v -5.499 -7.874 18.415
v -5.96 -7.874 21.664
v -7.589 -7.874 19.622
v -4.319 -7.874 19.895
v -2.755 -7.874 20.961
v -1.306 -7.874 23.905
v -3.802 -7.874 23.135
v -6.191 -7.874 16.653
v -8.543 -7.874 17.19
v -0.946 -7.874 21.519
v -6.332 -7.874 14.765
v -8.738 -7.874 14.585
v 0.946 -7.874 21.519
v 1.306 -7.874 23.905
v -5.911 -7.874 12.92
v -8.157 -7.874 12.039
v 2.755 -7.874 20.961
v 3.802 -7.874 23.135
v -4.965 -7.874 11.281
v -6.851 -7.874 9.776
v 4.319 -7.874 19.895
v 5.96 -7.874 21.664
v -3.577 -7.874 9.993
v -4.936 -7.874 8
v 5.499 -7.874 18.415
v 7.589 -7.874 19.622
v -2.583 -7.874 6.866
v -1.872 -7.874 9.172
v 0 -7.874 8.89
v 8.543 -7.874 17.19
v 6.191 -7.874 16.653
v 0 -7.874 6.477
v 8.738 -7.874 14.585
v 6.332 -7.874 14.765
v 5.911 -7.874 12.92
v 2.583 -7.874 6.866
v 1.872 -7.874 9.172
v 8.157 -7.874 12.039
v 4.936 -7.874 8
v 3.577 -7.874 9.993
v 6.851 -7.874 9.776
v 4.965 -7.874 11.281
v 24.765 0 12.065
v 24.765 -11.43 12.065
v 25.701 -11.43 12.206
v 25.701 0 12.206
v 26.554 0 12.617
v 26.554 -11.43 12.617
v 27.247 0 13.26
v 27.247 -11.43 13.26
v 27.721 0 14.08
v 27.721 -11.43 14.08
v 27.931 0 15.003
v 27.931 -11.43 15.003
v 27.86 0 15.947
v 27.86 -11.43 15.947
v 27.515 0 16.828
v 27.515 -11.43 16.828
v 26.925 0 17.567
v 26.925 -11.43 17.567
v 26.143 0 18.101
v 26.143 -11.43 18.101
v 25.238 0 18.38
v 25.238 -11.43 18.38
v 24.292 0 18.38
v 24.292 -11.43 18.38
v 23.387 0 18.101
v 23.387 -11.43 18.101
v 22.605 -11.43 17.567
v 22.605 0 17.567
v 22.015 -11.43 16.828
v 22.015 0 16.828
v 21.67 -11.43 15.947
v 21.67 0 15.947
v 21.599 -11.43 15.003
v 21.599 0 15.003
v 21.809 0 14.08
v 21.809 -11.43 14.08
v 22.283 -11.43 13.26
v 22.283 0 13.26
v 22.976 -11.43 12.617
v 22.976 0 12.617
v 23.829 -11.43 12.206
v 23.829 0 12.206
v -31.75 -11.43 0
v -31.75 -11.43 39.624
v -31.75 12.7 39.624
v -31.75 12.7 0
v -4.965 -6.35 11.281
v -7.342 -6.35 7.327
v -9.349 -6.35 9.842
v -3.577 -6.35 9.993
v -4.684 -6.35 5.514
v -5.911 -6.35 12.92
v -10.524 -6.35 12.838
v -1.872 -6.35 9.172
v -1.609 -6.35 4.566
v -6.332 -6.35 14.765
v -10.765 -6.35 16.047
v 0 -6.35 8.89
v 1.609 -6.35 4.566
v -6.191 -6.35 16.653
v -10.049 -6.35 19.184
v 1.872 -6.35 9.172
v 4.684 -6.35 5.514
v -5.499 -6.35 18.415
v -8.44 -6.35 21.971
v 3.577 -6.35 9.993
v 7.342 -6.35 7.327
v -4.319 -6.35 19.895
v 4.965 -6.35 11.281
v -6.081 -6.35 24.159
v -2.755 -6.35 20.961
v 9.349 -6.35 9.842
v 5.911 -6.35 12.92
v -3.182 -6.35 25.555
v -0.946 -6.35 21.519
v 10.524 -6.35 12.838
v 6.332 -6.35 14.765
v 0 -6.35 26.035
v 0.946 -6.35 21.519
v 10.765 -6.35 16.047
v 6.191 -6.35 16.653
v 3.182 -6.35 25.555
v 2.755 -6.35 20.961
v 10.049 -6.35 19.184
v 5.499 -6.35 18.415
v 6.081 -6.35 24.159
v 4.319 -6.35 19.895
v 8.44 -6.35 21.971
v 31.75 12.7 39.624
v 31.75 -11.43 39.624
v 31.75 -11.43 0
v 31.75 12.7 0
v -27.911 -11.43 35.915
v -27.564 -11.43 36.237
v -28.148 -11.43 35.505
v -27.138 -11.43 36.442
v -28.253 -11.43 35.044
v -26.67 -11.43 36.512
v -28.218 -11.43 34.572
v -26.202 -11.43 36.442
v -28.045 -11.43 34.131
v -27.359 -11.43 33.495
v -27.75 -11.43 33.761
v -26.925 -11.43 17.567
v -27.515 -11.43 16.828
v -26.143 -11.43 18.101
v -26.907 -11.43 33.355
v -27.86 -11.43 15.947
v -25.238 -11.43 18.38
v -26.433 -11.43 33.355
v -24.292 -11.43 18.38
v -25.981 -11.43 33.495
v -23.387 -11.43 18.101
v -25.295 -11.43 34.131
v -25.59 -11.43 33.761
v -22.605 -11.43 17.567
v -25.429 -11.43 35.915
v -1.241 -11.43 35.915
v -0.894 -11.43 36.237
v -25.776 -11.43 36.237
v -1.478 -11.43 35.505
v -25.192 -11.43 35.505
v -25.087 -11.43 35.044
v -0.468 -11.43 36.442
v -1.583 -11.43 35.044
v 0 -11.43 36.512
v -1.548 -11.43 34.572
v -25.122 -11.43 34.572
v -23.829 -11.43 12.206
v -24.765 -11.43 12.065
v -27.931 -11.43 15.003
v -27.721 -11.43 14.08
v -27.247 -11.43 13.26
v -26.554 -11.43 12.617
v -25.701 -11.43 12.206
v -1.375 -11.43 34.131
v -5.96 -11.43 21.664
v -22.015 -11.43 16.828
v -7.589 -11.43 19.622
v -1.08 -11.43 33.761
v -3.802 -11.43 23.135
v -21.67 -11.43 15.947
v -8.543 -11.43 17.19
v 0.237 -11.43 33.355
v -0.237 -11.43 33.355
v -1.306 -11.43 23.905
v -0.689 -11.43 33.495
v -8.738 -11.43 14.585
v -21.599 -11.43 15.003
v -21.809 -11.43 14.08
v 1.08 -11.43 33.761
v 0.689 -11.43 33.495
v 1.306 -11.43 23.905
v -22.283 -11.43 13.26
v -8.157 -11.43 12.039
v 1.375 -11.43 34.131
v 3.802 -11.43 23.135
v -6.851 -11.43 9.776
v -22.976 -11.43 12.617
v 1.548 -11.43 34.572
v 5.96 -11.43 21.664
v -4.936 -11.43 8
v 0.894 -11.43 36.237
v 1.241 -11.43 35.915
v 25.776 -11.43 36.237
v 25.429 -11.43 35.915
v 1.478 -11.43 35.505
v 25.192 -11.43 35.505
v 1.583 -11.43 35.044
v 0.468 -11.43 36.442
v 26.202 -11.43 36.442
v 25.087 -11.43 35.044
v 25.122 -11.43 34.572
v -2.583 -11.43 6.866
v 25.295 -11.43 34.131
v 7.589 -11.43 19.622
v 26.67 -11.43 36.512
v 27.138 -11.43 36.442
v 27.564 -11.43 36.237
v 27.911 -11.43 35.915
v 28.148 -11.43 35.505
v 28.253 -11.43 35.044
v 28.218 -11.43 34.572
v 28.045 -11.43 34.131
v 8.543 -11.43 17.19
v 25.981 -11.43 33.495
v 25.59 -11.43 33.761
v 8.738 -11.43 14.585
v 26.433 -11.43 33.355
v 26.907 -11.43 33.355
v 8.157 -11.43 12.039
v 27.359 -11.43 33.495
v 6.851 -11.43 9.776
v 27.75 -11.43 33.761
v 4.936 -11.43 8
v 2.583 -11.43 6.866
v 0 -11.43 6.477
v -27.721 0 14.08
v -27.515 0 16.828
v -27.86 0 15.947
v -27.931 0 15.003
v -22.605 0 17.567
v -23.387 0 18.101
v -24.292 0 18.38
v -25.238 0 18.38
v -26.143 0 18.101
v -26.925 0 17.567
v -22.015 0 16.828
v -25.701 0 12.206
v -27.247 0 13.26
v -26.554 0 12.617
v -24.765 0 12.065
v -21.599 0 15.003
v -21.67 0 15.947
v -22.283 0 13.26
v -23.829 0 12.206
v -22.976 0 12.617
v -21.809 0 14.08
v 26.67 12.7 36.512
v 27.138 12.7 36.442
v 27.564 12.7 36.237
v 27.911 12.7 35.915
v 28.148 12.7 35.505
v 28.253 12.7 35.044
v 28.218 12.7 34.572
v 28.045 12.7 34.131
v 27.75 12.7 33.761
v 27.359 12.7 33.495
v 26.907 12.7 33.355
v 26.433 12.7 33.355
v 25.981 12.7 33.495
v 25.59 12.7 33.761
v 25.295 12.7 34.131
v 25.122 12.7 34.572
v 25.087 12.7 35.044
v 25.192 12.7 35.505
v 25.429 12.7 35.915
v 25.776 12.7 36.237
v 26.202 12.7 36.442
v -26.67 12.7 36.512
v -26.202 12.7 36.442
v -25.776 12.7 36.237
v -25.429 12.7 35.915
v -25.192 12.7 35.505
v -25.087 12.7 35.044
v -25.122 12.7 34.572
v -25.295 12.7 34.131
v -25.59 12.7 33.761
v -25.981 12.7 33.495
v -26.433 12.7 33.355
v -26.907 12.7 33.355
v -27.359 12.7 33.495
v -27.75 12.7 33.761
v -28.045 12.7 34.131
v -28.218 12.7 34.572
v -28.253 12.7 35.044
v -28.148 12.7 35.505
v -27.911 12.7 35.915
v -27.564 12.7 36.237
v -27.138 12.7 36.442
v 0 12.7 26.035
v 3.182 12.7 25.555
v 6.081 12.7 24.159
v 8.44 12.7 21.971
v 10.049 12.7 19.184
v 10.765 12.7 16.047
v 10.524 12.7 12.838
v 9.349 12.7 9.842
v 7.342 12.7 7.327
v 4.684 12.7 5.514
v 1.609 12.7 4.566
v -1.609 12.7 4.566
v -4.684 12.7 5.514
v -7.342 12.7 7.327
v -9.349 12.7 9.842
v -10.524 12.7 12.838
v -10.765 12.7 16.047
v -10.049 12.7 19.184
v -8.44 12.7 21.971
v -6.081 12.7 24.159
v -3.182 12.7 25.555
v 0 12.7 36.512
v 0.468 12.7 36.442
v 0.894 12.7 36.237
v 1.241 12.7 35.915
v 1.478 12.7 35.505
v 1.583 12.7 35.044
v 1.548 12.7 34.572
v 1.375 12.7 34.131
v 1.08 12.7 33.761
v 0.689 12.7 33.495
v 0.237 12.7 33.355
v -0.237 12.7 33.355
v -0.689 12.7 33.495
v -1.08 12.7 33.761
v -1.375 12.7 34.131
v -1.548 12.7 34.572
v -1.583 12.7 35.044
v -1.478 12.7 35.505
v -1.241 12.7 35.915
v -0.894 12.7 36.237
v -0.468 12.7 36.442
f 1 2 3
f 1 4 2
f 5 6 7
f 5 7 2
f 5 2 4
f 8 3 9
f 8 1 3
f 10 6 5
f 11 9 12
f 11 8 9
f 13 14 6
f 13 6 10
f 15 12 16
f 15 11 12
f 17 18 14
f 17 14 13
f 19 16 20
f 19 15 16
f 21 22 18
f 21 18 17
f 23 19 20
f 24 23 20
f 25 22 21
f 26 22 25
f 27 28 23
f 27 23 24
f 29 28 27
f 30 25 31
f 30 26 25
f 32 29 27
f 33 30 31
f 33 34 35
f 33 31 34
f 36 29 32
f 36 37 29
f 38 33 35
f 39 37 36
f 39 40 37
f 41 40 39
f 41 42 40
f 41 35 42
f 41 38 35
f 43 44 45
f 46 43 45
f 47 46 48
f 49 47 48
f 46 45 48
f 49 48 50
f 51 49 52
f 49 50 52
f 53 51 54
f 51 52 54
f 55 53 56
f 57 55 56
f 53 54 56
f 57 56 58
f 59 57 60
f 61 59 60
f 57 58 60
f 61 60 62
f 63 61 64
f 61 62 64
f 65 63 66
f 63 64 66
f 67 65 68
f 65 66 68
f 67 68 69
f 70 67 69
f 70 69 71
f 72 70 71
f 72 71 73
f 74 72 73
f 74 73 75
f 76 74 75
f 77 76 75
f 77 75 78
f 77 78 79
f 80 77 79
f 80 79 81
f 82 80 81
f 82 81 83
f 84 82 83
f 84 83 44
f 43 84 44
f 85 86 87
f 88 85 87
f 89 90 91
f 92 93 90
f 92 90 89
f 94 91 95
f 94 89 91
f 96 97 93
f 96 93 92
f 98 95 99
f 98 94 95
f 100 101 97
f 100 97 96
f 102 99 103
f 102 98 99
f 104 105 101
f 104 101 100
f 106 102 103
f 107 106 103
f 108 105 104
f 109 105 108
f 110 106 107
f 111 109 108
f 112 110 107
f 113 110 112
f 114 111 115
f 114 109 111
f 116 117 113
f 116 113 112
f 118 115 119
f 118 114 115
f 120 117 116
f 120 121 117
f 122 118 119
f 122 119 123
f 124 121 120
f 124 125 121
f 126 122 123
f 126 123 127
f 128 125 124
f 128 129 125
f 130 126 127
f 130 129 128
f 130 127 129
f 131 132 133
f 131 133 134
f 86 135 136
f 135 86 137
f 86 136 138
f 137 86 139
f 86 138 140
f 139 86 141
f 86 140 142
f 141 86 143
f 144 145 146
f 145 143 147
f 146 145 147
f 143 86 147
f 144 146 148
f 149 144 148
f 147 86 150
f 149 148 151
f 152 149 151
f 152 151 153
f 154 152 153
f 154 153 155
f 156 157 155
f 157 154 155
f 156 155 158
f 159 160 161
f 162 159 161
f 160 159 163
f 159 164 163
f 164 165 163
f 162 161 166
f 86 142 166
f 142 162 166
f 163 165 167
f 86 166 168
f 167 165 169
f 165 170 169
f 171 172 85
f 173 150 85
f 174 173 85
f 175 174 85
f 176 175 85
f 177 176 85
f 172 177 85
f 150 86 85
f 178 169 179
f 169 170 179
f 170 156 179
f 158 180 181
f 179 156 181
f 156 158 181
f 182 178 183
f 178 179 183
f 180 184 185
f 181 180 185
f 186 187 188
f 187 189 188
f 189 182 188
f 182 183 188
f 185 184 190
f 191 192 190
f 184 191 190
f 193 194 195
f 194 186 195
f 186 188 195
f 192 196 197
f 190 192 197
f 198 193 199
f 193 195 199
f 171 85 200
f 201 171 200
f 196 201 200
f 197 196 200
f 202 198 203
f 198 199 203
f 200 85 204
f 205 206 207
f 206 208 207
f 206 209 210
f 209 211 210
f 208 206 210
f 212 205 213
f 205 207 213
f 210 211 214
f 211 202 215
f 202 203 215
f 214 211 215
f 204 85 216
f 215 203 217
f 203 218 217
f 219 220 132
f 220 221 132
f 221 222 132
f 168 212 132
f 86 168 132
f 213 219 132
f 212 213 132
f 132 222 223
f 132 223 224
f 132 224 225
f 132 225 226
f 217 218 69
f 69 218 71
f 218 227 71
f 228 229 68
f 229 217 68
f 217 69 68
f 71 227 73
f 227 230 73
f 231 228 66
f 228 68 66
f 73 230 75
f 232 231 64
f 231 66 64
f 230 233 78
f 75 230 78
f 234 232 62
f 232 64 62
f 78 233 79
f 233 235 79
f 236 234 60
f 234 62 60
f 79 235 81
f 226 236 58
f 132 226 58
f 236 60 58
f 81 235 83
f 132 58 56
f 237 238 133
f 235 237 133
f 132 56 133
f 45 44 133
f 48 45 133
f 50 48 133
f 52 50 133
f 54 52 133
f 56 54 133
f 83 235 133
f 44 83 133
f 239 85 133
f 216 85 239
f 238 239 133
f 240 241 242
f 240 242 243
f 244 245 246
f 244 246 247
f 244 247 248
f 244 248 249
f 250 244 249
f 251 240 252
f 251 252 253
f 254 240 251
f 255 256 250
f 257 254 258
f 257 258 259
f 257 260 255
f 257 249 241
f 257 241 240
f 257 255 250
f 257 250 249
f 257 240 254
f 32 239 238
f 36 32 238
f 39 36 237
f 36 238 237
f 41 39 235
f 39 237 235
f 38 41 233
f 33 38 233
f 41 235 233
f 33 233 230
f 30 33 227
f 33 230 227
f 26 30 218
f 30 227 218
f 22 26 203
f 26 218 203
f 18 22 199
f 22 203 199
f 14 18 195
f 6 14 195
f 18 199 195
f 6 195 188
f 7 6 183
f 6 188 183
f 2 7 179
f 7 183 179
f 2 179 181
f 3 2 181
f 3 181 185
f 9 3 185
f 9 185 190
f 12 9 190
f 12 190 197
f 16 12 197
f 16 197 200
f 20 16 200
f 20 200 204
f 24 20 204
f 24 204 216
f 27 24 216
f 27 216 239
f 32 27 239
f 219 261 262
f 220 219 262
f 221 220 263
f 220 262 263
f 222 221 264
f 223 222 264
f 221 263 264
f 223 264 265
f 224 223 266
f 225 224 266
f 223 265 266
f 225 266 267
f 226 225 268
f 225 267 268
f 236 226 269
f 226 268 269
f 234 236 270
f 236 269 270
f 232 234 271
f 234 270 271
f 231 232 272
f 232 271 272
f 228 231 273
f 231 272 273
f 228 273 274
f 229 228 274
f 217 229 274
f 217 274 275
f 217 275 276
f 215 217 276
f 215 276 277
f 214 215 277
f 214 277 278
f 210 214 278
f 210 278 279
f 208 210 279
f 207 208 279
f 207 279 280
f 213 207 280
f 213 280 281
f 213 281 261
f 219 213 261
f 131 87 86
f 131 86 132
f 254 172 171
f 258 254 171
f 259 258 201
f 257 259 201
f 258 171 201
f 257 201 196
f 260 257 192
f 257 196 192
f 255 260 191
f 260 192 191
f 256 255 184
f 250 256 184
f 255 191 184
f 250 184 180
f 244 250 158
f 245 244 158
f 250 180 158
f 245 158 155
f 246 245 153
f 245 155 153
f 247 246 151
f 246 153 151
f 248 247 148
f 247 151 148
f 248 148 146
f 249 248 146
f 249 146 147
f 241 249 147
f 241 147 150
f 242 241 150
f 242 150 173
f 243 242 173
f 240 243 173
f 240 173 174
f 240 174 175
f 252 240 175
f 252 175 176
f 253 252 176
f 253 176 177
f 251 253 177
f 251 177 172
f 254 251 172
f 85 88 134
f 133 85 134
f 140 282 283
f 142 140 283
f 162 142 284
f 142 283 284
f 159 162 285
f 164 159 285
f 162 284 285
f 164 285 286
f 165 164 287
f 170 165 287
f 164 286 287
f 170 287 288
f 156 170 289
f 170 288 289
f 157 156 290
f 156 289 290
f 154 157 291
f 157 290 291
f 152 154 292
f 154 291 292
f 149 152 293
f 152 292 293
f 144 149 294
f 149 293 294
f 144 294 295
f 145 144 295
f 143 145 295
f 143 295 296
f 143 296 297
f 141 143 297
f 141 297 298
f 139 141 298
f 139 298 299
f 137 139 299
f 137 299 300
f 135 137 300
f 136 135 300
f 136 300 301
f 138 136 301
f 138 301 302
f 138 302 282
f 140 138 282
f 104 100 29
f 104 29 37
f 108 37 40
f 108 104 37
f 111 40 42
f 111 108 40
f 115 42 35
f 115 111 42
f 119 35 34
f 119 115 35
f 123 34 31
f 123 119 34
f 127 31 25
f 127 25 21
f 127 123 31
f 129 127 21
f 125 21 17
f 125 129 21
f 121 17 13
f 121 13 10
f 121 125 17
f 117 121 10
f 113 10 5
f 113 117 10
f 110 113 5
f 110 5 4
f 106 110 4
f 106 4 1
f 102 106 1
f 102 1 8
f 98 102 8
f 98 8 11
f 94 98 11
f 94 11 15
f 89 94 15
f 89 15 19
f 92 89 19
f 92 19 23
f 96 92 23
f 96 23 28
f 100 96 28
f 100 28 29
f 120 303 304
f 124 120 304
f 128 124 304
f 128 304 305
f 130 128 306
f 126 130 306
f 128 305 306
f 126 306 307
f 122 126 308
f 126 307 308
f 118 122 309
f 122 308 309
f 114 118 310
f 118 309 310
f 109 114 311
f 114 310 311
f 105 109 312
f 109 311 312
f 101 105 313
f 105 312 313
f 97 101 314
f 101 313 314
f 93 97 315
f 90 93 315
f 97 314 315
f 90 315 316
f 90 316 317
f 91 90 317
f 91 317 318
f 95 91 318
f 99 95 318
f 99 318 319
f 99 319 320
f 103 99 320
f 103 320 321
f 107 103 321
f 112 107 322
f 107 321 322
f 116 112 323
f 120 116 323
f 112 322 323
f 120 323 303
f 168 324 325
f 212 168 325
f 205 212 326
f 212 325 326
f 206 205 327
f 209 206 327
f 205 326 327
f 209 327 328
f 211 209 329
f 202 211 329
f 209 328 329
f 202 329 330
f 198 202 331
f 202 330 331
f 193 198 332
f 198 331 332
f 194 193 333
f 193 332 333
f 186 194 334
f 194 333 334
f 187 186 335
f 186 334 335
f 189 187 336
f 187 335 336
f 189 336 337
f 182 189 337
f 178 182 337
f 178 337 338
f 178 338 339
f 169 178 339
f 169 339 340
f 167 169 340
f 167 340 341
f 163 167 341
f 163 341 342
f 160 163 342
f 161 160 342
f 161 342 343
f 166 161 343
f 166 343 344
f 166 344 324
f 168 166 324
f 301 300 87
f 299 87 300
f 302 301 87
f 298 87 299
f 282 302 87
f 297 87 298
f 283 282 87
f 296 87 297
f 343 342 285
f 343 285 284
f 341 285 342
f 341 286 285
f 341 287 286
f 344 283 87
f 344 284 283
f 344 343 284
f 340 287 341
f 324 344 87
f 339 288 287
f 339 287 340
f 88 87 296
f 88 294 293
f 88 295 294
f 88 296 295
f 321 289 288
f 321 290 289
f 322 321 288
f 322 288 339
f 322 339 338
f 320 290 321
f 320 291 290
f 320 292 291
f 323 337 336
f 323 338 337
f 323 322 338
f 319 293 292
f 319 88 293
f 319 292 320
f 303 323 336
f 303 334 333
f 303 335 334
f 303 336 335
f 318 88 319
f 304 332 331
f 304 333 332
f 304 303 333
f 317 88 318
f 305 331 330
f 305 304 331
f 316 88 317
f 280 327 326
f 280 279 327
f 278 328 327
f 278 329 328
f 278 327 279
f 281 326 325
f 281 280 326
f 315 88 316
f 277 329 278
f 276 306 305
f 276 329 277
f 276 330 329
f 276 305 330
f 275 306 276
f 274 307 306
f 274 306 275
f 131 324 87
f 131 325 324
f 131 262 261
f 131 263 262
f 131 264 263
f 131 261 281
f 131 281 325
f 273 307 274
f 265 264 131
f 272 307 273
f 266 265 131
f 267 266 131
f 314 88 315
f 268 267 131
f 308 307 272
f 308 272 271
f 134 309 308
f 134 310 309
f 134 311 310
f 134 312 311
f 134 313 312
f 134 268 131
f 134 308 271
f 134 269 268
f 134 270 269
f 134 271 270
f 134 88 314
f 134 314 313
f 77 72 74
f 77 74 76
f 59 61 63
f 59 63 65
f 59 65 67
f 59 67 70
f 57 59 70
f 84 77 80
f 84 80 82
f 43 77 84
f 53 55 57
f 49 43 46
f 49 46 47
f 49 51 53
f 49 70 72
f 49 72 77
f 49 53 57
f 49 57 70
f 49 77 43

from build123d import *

# Parameters (mm, degrees)
SKETCH1_W           = 63.5
SKETCH1_H           = 25.4
BOSS_EXTRUDE1_DEPTH = 38.1
SKETCH2_R           = 3.175
CUT_EXTRUDE1_DEPTH  = 12.7
SKETCH2_3_R         = 8.763
CUT_EXTRUDE2_DEPTH  = 4.826
CUT_EXTRUDE3_START  = -20.574
SKETCH3_R           = 6.35
CUT_EXTRUDE3_DEPTH  = 20.574
SKETCH4_R           = 10.795
CUT_EXTRUDE4_DEPTH  = 19.05
SKETCH5_R           = 1.5875
CUT_EXTRUDE5_DEPTH  = 50.8
SKETCH6_W           = 63.5
SKETCH6_H           = 1.27
CUT_EXTRUDE6_DEPTH  = 38.1
SKETCH7_W           = 63.5
SKETCH7_H           = 24.13
BOSS_EXTRUDE2_DEPTH = 1.524


with BuildPart() as part:
    # Sketch1 → Boss-Extrude1 (new body)
    with BuildSketch(Plane.XY):
        Rectangle(SKETCH1_W, SKETCH1_H)
    extrude(amount=BOSS_EXTRUDE1_DEPTH)

    # Sketch2 → Cut-Extrude1 (cut)
    with BuildSketch(Plane.XZ.offset(12.7)):
        with Locations(Location((-24.765, 15.24, 0), (0, 0, 270))):
            Circle(SKETCH2_R)
        with Locations(Location((24.765, 15.24, 0), (0, 0, 270))):
            Circle(SKETCH2_R)
    extrude(amount=-CUT_EXTRUDE1_DEPTH, mode=Mode.SUBTRACT)

    # Sketch2<3> → Cut-Extrude2 (cut)
    with BuildSketch(Plane.XZ.offset(12.7)):
        with Locations(Location((0, 15.24, 0), (0, 0, 270))):
            Circle(SKETCH2_3_R)
    extrude(amount=-CUT_EXTRUDE2_DEPTH, mode=Mode.SUBTRACT)

    # Sketch3 → Cut-Extrude3 (cut)
    with BuildSketch(Plane.XZ.offset(7.874).offset(CUT_EXTRUDE3_START)):
        with Locations(Location((0, 15.24, 0), (0, 0, 270))):
            Circle(SKETCH3_R)
    extrude(amount=CUT_EXTRUDE3_DEPTH, mode=Mode.SUBTRACT)

    # Sketch4 → Cut-Extrude4 (cut)
    with BuildSketch(Plane(origin=(0, 12.7, 0), x_dir=(1, 0, 0), z_dir=(0, 1, 0))):
        with Locations(Location((0, -15.24, 0), (0, 0, 270))):
            Circle(SKETCH4_R)
    extrude(amount=-CUT_EXTRUDE4_DEPTH, mode=Mode.SUBTRACT)

    # Sketch5 → Cut-Extrude5 (cut)
    with BuildSketch(Plane(origin=(0, 12.7, 0), x_dir=(1, 0, 0), z_dir=(0, 1, 0))):
        with Locations(Location((-26.67, -34.925, 0), (0, 0, 270))):
            Circle(SKETCH5_R)
        with Locations(Location((0, -34.925, 0), (0, 0, 270))):
            Circle(SKETCH5_R)
        with Locations(Location((26.67, -34.925, 0), (0, 0, 270))):
            Circle(SKETCH5_R)
    extrude(amount=-CUT_EXTRUDE5_DEPTH, mode=Mode.SUBTRACT)

    # Sketch6 → Cut-Extrude6 (cut)
    with BuildSketch(Plane.XY.offset(38.1)):
        with Locations((0, -12.065)):
            Rectangle(SKETCH6_W, SKETCH6_H)
    extrude(amount=-CUT_EXTRUDE6_DEPTH, mode=Mode.SUBTRACT)

    # Sketch7 → Boss-Extrude2 (add)
    with BuildSketch(Plane.XY.offset(38.1)):
        with Locations((0, 0.635)):
            Rectangle(SKETCH7_W, SKETCH7_H)
    extrude(amount=BOSS_EXTRUDE2_DEPTH)


solid = part.part
